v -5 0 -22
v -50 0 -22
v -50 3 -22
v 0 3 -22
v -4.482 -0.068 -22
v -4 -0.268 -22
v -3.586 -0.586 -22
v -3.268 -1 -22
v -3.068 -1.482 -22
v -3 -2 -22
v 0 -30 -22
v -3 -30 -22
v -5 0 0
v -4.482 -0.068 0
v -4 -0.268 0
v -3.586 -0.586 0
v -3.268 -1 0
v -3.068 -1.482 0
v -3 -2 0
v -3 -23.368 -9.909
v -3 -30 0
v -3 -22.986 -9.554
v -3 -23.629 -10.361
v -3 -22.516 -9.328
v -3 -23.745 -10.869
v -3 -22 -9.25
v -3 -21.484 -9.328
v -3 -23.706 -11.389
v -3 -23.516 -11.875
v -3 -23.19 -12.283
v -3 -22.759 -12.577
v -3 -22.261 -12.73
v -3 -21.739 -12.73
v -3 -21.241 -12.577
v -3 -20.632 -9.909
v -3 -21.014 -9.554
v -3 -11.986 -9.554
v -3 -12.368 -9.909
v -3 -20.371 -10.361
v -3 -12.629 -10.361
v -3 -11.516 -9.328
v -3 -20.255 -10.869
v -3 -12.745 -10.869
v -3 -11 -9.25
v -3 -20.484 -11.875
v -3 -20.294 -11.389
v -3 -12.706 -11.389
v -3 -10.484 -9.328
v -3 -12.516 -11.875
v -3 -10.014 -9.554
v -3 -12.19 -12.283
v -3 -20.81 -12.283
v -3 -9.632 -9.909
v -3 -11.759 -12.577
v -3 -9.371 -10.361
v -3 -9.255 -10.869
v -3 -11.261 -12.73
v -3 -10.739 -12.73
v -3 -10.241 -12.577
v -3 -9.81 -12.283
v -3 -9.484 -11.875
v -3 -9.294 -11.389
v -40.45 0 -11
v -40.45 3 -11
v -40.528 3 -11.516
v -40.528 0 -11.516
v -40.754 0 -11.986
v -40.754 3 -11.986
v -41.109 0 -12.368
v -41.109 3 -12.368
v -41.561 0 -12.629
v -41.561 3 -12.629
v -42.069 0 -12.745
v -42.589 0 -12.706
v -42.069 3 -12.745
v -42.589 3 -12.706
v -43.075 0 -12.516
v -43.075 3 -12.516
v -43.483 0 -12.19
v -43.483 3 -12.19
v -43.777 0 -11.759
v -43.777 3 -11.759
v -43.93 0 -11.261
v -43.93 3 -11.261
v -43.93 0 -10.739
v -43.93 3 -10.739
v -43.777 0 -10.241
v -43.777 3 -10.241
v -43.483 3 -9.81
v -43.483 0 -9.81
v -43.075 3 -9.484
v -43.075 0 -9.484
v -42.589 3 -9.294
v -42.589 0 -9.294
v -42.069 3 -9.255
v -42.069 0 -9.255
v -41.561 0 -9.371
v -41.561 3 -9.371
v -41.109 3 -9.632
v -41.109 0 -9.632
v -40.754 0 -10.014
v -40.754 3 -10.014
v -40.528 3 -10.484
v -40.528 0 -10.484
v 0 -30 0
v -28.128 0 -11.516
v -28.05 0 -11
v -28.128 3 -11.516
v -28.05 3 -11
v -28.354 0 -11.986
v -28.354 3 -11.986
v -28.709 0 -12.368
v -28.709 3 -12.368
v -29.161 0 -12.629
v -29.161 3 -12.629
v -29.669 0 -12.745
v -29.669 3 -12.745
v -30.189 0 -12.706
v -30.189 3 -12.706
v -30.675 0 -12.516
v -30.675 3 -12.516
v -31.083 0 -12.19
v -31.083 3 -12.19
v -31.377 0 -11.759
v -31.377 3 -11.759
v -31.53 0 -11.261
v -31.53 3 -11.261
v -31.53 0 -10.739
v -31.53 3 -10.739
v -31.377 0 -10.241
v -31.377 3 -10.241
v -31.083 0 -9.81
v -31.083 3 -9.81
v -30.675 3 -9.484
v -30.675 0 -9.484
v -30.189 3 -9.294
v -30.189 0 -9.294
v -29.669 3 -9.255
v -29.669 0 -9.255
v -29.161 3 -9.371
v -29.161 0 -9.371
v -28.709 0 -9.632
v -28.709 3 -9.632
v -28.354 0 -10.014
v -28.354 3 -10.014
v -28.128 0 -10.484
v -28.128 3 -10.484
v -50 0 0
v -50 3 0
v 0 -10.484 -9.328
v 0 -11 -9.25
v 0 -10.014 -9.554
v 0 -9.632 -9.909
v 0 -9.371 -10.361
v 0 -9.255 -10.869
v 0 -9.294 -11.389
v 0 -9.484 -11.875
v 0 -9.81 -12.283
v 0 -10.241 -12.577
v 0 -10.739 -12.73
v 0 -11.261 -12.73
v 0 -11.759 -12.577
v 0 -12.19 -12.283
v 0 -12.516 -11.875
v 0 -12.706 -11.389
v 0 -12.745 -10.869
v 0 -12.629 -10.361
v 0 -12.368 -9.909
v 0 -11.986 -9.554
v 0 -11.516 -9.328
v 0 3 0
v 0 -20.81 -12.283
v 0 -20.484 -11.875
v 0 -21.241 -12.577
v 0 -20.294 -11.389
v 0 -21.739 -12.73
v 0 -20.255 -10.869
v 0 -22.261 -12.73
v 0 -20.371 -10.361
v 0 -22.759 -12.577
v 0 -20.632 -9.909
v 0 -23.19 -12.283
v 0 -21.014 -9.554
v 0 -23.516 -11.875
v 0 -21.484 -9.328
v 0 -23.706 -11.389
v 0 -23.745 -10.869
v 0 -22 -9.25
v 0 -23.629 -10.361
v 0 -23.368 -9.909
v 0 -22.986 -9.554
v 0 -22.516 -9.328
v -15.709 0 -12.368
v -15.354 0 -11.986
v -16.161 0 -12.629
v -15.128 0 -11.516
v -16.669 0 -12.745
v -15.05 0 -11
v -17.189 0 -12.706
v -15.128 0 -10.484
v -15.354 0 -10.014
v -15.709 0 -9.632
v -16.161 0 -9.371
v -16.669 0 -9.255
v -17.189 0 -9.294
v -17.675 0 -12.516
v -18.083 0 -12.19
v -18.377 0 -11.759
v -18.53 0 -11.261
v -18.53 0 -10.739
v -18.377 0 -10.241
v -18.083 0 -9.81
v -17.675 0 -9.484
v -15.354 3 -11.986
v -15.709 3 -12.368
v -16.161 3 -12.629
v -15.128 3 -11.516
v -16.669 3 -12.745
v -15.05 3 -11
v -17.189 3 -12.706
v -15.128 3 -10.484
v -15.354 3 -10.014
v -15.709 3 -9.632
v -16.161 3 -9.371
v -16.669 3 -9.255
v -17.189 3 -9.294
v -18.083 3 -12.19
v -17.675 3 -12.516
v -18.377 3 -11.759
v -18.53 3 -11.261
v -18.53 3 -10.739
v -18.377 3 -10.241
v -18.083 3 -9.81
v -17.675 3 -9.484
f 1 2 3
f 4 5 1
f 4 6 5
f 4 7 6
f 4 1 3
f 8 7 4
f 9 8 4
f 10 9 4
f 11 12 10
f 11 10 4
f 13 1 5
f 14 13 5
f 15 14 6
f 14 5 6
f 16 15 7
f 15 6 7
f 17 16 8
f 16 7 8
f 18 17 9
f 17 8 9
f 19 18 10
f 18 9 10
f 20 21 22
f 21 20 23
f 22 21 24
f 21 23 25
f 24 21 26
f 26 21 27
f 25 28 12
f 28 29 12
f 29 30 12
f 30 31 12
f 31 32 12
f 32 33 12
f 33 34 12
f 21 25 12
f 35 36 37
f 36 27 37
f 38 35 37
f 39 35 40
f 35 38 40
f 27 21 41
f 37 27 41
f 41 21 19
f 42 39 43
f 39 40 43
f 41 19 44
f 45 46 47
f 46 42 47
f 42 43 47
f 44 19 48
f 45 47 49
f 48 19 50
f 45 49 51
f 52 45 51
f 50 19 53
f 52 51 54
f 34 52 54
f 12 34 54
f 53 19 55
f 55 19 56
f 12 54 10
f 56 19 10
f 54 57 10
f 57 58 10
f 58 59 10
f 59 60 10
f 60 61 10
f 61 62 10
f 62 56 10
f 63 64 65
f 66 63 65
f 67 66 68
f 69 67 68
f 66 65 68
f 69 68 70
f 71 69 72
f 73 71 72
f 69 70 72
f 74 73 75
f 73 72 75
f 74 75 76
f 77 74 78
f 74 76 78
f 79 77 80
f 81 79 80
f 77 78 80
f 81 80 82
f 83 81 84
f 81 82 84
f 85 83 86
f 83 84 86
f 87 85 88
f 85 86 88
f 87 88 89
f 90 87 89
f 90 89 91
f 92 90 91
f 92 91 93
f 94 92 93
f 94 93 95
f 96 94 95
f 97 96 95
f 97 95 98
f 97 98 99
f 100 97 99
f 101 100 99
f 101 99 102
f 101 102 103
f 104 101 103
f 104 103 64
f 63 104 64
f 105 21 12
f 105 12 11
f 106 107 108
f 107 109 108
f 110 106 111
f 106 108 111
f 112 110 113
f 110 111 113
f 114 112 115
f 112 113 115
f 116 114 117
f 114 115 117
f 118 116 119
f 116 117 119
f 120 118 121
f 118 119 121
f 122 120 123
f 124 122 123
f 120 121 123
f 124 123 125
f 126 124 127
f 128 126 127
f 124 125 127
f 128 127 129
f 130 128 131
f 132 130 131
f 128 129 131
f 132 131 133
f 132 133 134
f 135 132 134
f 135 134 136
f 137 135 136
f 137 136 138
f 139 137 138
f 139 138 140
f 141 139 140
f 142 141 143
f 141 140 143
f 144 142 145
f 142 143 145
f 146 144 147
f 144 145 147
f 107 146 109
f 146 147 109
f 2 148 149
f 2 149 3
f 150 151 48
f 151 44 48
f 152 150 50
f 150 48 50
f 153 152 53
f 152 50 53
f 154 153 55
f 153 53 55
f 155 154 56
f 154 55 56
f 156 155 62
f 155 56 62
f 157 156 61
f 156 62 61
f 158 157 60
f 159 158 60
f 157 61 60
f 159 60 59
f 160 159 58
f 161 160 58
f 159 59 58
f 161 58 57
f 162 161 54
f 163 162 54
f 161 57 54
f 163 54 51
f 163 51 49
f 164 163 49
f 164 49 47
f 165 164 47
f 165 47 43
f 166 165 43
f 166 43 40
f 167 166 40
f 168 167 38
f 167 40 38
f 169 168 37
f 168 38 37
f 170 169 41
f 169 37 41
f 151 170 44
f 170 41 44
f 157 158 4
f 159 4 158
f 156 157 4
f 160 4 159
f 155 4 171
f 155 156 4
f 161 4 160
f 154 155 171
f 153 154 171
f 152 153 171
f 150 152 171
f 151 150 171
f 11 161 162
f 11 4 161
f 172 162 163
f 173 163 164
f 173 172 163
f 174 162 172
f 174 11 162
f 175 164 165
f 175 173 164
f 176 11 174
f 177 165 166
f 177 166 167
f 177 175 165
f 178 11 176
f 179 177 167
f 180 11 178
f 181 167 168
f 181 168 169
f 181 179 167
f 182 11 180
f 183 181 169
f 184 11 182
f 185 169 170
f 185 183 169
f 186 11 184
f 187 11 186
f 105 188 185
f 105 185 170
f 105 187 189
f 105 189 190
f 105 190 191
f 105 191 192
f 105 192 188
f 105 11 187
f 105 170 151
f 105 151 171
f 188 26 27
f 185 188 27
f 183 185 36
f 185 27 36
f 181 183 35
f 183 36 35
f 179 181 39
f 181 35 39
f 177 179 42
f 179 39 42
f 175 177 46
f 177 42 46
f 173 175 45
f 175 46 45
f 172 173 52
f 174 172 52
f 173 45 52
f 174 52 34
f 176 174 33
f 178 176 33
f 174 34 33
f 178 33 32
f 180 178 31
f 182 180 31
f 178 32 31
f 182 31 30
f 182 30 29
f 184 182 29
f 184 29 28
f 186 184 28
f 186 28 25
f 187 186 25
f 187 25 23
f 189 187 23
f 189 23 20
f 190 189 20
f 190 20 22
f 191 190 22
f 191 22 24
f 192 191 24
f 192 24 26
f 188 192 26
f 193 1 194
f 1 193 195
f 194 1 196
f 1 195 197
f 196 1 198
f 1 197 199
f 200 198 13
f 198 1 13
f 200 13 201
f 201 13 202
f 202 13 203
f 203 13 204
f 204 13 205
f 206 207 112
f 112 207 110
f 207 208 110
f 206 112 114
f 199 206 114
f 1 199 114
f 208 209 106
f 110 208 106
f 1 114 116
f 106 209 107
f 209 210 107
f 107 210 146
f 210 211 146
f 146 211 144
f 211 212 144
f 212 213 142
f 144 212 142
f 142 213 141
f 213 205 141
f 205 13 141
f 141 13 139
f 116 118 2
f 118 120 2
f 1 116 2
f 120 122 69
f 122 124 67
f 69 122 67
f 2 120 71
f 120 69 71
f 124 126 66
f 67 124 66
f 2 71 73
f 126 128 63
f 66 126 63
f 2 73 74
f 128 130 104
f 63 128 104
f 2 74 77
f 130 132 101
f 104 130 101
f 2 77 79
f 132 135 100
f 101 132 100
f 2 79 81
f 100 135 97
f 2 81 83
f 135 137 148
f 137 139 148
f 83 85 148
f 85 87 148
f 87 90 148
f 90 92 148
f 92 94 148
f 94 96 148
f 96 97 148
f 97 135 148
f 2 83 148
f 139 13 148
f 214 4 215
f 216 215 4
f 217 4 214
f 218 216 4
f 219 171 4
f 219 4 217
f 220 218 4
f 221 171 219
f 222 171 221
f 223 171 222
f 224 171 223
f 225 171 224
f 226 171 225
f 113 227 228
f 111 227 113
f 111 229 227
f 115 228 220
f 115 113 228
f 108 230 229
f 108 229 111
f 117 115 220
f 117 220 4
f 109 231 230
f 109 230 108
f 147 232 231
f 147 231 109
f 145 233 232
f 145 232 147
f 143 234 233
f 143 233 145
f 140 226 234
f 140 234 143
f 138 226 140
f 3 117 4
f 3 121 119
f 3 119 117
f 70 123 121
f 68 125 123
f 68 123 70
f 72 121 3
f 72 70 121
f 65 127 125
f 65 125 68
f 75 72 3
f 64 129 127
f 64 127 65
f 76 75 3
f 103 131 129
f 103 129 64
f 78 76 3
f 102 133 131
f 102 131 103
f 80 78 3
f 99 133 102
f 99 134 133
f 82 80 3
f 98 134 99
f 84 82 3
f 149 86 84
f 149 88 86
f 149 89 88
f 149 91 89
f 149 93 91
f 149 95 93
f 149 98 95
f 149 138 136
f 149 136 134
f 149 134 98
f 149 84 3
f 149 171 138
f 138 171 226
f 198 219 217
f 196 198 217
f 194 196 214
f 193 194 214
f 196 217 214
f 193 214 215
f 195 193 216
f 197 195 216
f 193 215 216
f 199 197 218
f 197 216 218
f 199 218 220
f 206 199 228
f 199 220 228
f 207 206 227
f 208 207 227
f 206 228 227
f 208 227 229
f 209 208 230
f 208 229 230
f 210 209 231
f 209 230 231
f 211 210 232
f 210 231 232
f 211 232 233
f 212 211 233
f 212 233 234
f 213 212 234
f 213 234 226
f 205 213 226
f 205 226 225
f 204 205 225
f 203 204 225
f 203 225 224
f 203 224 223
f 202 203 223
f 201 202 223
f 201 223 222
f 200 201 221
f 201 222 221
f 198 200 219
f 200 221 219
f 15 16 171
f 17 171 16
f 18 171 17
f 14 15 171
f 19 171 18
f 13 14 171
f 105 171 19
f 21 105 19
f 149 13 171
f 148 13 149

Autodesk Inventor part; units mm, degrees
ref_plane "YZ Plane" through (0, 0, 0) normal (1, 0, 0) x (0, 1, 0)
ref_plane "XZ Plane" through (0, 0, 0) normal (0, 1, 0) x (-1, 0, 0)
ref_plane "XY Plane" through (0, 0, 0) normal (0, 0, 1) x (1, 0, 0)
sketch "Sketch1" plane through (0, 0, 0) normal (0, 1, 0) x (-1, 0, 0)
  line L0 (0, 0) -> (50, 0)
  line L1 (50, 0) -> (50, -22)
  line L2 (50, -22) -> (0, -22)
  line L3 (0, -22) -> (0, 0)
  dimension "d0" = 50
  dimension "d1" = 22
extrude "Extrusion1" add sketch "Sketch1" along normal blind 3
sketch "Sketch2" plane through (0, 0, 0) normal (0, -1, 0) x (1, 0, 0)
  line L0 (-50, 0) -> (0, 0) projected
  line L1 (0, -22) -> (-50, -22) projected
  line L2 (0, 0) -> (-3, 0)
  line L3 (-3, 0) -> (-3, -22)
  line L4 (-3, -22) -> (0, -22)
  line L5 (0, -22) -> (0, 0)
  dimension "d4" = 3
extrude "Extrusion2" add sketch "Sketch2" along normal blind 30
sketch "Sketch3" plane through (0, 3, 0) normal (0, 1, 0) x (1, 0, 0)
  circle A0 centre (-16.8, 11) radius 1.75
  line L0 (0, 22) -> (-50, 22) projected
  circle A1 centre (-42.2, 11) radius 1.75
  line L1 (-3, 0) -> (-29.8, 0)
  line L2 (-50, 0) -> (0, 0) projected
  line L3 (-29.8, 0) -> (-29.8, 11)
  circle A2 centre (-29.8, 11) radius 1.75
  dimension "d7" = 3.5
  dimension "d8" = 11
  dimension "d9" = 13.8
  dimension "d10" = 3.5
  dimension "d11" = 25.4
  dimension "d12" = 11
  dimension "d22" = 26.8
  dimension "d23" = 11
  dimension "d24" = 3.5
sketch "Sketch4" plane through (-3, 0, -22) normal (-1, 0, 0) x (0, 0, 1)
  line L0 (22, 0) -> (0, 0) projected
  line L1 (11, 0) -> (11, -11)
  circle A0 centre (11, -11) radius 1.75
  line L2 (11, -11) -> (11, -22)
  circle A1 centre (11, -22) radius 1.75
  dimension "d15" = 11
  dimension "d16" = 3.5
  dimension "d17" = 11
  dimension "d18" = 3.5
extrude "Extrusion4" cut sketch "Sketch4" against normal blind 3
fillet "Fillet1" radius 2 1 edges at (-3, 0, -11)
extrude "Extrusion5" cut sketch "Sketch3" against normal blind 3
properties part number "Right_BracketMount"
